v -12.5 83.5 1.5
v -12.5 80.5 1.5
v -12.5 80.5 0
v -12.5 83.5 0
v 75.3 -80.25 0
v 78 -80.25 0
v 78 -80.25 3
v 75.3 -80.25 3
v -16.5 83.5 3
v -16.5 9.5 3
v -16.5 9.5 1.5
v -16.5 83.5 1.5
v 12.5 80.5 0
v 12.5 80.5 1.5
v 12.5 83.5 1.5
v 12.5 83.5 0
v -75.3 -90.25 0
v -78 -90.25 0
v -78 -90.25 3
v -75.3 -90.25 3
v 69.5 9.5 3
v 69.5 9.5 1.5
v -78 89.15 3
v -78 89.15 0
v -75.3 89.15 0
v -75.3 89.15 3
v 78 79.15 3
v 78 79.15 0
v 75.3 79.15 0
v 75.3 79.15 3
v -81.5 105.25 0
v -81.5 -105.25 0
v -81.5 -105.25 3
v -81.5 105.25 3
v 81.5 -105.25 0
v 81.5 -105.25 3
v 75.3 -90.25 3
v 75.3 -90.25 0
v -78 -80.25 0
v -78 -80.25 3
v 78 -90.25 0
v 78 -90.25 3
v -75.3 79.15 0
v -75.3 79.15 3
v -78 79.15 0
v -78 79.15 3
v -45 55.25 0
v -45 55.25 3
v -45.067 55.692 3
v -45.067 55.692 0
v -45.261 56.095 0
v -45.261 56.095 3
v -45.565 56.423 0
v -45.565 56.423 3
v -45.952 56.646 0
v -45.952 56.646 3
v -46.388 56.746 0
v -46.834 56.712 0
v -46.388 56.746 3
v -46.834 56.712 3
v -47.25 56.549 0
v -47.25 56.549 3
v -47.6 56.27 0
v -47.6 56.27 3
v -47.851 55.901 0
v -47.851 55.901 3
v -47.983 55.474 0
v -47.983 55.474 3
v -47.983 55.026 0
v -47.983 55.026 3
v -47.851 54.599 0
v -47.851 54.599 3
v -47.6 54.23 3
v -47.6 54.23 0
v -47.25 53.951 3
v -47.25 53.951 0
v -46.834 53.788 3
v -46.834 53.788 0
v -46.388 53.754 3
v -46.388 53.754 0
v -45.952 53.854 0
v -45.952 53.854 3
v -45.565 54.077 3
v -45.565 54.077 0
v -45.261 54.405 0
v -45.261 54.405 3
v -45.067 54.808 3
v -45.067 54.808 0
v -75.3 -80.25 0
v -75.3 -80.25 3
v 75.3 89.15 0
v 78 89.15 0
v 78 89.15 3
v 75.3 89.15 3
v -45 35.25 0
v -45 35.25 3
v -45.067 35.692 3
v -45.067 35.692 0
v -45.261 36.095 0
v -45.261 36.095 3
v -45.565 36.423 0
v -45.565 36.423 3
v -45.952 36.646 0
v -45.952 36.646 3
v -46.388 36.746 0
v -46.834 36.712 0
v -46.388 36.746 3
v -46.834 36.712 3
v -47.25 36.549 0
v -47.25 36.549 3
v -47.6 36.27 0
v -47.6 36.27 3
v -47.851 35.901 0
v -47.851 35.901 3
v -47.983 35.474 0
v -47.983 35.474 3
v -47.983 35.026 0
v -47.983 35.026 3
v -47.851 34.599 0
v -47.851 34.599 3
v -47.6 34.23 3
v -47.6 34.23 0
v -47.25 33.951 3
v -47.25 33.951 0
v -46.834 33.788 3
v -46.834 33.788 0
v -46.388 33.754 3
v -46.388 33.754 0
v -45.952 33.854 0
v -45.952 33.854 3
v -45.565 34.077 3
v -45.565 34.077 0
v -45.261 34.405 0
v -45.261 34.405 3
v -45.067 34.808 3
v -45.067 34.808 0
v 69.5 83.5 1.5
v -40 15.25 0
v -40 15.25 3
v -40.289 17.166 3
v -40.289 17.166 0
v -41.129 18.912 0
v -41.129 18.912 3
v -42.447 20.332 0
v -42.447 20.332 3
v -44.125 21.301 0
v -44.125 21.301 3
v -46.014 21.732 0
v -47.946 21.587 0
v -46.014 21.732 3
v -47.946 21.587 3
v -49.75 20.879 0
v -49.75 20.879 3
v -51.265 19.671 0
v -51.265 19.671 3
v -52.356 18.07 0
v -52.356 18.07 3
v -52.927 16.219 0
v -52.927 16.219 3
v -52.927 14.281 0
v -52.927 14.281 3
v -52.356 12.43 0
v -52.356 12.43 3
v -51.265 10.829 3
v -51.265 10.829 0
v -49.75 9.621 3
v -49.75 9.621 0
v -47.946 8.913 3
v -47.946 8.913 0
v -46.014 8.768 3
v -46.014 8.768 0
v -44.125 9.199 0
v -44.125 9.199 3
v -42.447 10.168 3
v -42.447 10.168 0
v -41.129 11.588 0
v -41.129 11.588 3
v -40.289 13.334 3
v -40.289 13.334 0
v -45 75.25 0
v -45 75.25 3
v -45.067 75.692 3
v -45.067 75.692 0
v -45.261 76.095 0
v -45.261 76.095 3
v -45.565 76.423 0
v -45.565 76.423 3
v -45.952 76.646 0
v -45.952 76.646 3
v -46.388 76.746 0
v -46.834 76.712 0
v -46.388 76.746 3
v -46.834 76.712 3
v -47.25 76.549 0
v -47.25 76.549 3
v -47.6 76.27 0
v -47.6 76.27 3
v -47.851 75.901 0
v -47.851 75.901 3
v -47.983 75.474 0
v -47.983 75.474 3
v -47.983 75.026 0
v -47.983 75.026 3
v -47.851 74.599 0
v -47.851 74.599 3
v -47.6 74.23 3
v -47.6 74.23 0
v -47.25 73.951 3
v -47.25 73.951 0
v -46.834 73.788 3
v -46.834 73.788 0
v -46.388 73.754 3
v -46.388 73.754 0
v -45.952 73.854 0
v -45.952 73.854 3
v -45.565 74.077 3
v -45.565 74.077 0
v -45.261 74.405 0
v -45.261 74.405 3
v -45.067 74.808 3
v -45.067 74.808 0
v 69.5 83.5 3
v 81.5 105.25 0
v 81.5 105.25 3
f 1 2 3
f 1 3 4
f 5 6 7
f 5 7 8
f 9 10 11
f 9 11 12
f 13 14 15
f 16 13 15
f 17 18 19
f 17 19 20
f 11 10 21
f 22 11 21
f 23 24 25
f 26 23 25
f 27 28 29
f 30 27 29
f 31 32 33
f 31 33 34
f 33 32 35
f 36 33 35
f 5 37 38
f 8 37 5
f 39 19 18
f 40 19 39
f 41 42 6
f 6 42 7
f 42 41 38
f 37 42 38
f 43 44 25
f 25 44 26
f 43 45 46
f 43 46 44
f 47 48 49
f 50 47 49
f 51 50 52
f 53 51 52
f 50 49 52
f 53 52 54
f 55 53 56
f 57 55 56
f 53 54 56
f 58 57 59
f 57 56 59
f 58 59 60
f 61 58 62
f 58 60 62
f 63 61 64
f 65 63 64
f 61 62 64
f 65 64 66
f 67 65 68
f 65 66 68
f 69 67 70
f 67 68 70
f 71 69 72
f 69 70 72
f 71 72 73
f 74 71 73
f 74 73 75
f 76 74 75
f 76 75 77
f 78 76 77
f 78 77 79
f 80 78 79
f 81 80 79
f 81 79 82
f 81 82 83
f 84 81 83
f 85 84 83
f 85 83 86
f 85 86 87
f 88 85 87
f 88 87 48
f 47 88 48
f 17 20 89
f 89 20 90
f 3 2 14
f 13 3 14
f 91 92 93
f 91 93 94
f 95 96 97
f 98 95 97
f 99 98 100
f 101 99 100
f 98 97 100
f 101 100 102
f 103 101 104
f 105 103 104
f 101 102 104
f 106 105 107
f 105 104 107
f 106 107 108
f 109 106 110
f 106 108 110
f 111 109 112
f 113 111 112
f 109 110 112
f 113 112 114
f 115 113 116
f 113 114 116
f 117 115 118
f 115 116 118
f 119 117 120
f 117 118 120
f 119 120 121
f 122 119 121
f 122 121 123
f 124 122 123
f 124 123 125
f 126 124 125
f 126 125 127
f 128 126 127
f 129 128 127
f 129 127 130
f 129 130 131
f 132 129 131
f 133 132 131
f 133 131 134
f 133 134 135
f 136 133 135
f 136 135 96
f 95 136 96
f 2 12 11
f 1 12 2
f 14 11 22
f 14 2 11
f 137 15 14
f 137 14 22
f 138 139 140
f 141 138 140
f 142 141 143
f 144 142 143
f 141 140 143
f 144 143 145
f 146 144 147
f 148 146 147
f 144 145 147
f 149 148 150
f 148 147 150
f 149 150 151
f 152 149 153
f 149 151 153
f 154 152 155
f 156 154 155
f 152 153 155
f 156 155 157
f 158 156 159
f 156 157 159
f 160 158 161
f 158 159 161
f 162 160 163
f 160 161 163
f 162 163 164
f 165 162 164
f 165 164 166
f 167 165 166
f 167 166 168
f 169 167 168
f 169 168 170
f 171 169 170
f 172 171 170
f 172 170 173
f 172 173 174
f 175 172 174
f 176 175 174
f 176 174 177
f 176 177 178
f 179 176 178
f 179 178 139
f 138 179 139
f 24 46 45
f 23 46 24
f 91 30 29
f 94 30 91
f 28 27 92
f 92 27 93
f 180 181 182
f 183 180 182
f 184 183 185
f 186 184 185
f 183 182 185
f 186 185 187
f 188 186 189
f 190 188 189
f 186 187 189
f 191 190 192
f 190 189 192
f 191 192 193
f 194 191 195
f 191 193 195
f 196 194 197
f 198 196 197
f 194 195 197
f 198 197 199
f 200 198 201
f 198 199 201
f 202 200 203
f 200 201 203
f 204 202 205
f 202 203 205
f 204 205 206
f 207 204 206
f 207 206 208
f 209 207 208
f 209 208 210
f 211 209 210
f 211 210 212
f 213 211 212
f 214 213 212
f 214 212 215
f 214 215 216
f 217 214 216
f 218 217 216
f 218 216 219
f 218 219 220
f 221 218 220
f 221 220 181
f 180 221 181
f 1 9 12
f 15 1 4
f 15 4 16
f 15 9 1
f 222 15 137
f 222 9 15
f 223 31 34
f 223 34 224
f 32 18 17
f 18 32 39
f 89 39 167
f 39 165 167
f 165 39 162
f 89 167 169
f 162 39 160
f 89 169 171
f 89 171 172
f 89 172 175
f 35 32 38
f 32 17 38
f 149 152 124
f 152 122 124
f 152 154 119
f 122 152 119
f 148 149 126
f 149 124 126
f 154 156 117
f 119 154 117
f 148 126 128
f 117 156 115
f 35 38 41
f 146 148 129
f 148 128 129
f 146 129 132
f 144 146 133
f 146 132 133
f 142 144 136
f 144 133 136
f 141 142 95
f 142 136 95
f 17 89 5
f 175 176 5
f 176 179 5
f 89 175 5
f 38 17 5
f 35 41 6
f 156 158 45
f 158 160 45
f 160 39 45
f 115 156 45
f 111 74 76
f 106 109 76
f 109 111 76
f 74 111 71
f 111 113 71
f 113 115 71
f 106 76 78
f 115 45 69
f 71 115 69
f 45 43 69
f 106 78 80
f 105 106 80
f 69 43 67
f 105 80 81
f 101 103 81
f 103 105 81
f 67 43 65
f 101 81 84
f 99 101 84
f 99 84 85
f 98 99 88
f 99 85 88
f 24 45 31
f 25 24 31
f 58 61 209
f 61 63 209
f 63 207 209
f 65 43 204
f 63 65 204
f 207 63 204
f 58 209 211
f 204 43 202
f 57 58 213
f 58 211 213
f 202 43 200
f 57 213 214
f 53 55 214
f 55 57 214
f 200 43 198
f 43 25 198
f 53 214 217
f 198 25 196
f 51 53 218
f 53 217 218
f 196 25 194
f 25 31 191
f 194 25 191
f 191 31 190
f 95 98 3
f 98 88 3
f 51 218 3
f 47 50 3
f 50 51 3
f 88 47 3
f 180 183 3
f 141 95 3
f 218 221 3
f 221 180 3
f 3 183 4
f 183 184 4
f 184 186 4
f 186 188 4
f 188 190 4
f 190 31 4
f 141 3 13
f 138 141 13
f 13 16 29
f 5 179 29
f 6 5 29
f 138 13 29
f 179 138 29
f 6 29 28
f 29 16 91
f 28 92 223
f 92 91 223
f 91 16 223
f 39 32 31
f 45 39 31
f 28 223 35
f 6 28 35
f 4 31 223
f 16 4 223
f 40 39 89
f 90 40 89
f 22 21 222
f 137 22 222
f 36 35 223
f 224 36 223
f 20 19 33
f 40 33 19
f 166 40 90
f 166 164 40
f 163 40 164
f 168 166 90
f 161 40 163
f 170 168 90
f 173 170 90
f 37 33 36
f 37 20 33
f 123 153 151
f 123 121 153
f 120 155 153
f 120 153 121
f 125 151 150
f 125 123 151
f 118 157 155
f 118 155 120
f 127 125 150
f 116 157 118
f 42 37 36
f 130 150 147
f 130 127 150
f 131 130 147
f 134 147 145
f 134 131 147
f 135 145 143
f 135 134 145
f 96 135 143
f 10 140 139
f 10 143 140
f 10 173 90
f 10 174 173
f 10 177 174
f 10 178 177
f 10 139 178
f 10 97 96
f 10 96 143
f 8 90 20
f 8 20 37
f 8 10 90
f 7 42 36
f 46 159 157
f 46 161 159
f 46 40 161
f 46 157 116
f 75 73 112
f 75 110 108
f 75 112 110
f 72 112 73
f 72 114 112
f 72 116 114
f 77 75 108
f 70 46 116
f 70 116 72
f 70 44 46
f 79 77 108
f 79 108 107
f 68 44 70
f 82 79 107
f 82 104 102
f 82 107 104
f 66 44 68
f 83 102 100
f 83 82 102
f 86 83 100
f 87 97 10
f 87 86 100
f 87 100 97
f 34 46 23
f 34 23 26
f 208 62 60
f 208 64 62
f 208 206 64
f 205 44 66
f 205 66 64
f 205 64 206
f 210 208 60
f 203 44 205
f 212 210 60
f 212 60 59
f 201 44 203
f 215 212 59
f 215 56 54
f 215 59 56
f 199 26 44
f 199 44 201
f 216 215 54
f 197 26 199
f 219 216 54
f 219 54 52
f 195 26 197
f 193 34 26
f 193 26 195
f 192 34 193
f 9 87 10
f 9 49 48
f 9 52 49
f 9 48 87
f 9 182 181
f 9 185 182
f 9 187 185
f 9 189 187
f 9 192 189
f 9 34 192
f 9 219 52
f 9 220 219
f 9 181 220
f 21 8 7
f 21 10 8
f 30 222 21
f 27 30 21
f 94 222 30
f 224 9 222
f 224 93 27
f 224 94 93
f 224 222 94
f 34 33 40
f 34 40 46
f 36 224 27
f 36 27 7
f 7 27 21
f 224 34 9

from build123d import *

# Parameters (mm, degrees)
SKETCH1_W           = 163
SKETCH1_H           = 210.5
BOSS_EXTRUDE1_DEPTH = 3
SKETCH2_W           = 2.7
SKETCH2_H           = 10
CUT_EXTRUDE1_DEPTH  = 3
SKETCH3_W           = 86
SKETCH3_H           = 74
CUT_EXTRUDE2_DEPTH  = 1.5
CUT_EXTRUDE3_REACH  = 3.5
SKETCH4_W           = 25
SKETCH4_H           = 3
CUT_EXTRUDE5_REACH  = 5
SKETCH5_R           = 1.5
SKETCH5_R_2         = 6.5


with BuildPart() as part:
    # Sketch1 → Boss-Extrude1 (new body)
    with BuildSketch(Plane.XY):
        Rectangle(SKETCH1_W, SKETCH1_H)
    extrude(amount=BOSS_EXTRUDE1_DEPTH)

    # Sketch2 → Cut-Extrude1 (cut)
    with BuildSketch(Plane.XY.offset(3)):
        with Locations((-76.65, -85.25)):
            Rectangle(SKETCH2_W, SKETCH2_H)
        with Locations((-76.65, 84.15)):
            Rectangle(SKETCH2_W, SKETCH2_H)
    cut_extrude1 = extrude(amount=-CUT_EXTRUDE1_DEPTH, mode=Mode.SUBTRACT)

    # Mirror3: Cut-Extrude1 across plane
    add(cut_extrude1.mirror(Plane(origin=(0, 0, 0), x_dir=(0, 0, 1), z_dir=(1, 0, 0))), mode=Mode.SUBTRACT)

    # Sketch3 → Cut-Extrude2 (cut)
    with BuildSketch(Plane.XY.offset(3)):
        with Locations((26.5, 46.5)):
            Rectangle(SKETCH3_W, SKETCH3_H)
    extrude(amount=-CUT_EXTRUDE2_DEPTH, mode=Mode.SUBTRACT)

    # Sketch4 → Cut-Extrude3 (cut, up to next)
    with BuildSketch(Plane.XY.offset(1.5), mode=Mode.PRIVATE) as cut_extrude3_sk1:
        with Locations((0, 82)):
            Rectangle(SKETCH4_W, SKETCH4_H)
    cut_extrude3_tool1 = extrude(cut_extrude3_sk1.sketch, amount=-CUT_EXTRUDE3_REACH, mode=Mode.PRIVATE) & part.part
    add(cut_extrude3_tool1.solids().sort_by_distance((0, 82, 1.5))[0], mode=Mode.SUBTRACT)

    # Sketch5 → Cut-Extrude5 (cut, up to next)
    with BuildSketch(Plane.XY.offset(3), mode=Mode.PRIVATE) as cut_extrude5_sk1:
        with Locations((-46.5, 75.25)):
            Circle(SKETCH5_R)
    cut_extrude5_tool1 = extrude(cut_extrude5_sk1.sketch, amount=-CUT_EXTRUDE5_REACH, mode=Mode.PRIVATE) & part.part
    add(cut_extrude5_tool1.solids().sort_by_distance((-46.5, 75.25, 3))[0], mode=Mode.SUBTRACT)
    # Sketch5 → Cut-Extrude5 (cut, up to next)
    with BuildSketch(Plane.XY.offset(3), mode=Mode.PRIVATE) as cut_extrude5_sk2:
        with Locations((-46.5, 55.25)):
            Circle(SKETCH5_R)
    cut_extrude5_tool2 = extrude(cut_extrude5_sk2.sketch, amount=-CUT_EXTRUDE5_REACH, mode=Mode.PRIVATE) & part.part
    add(cut_extrude5_tool2.solids().sort_by_distance((-46.5, 55.25, 3))[0], mode=Mode.SUBTRACT)
    # Sketch5 → Cut-Extrude5 (cut, up to next)
    with BuildSketch(Plane.XY.offset(3), mode=Mode.PRIVATE) as cut_extrude5_sk3:
        with Locations((-46.5, 35.25)):
            Circle(SKETCH5_R)
    cut_extrude5_tool3 = extrude(cut_extrude5_sk3.sketch, amount=-CUT_EXTRUDE5_REACH, mode=Mode.PRIVATE) & part.part
    add(cut_extrude5_tool3.solids().sort_by_distance((-46.5, 35.25, 3))[0], mode=Mode.SUBTRACT)
    # Sketch5 → Cut-Extrude5 (cut, up to next)
    with BuildSketch(Plane.XY.offset(3), mode=Mode.PRIVATE) as cut_extrude5_sk4:
        with Locations((-46.5, 15.25)):
            Circle(SKETCH5_R_2)
    cut_extrude5_tool4 = extrude(cut_extrude5_sk4.sketch, amount=-CUT_EXTRUDE5_REACH, mode=Mode.PRIVATE) & part.part
    add(cut_extrude5_tool4.solids().sort_by_distance((-46.5, 15.25, 3))[0], mode=Mode.SUBTRACT)


solid = part.part
